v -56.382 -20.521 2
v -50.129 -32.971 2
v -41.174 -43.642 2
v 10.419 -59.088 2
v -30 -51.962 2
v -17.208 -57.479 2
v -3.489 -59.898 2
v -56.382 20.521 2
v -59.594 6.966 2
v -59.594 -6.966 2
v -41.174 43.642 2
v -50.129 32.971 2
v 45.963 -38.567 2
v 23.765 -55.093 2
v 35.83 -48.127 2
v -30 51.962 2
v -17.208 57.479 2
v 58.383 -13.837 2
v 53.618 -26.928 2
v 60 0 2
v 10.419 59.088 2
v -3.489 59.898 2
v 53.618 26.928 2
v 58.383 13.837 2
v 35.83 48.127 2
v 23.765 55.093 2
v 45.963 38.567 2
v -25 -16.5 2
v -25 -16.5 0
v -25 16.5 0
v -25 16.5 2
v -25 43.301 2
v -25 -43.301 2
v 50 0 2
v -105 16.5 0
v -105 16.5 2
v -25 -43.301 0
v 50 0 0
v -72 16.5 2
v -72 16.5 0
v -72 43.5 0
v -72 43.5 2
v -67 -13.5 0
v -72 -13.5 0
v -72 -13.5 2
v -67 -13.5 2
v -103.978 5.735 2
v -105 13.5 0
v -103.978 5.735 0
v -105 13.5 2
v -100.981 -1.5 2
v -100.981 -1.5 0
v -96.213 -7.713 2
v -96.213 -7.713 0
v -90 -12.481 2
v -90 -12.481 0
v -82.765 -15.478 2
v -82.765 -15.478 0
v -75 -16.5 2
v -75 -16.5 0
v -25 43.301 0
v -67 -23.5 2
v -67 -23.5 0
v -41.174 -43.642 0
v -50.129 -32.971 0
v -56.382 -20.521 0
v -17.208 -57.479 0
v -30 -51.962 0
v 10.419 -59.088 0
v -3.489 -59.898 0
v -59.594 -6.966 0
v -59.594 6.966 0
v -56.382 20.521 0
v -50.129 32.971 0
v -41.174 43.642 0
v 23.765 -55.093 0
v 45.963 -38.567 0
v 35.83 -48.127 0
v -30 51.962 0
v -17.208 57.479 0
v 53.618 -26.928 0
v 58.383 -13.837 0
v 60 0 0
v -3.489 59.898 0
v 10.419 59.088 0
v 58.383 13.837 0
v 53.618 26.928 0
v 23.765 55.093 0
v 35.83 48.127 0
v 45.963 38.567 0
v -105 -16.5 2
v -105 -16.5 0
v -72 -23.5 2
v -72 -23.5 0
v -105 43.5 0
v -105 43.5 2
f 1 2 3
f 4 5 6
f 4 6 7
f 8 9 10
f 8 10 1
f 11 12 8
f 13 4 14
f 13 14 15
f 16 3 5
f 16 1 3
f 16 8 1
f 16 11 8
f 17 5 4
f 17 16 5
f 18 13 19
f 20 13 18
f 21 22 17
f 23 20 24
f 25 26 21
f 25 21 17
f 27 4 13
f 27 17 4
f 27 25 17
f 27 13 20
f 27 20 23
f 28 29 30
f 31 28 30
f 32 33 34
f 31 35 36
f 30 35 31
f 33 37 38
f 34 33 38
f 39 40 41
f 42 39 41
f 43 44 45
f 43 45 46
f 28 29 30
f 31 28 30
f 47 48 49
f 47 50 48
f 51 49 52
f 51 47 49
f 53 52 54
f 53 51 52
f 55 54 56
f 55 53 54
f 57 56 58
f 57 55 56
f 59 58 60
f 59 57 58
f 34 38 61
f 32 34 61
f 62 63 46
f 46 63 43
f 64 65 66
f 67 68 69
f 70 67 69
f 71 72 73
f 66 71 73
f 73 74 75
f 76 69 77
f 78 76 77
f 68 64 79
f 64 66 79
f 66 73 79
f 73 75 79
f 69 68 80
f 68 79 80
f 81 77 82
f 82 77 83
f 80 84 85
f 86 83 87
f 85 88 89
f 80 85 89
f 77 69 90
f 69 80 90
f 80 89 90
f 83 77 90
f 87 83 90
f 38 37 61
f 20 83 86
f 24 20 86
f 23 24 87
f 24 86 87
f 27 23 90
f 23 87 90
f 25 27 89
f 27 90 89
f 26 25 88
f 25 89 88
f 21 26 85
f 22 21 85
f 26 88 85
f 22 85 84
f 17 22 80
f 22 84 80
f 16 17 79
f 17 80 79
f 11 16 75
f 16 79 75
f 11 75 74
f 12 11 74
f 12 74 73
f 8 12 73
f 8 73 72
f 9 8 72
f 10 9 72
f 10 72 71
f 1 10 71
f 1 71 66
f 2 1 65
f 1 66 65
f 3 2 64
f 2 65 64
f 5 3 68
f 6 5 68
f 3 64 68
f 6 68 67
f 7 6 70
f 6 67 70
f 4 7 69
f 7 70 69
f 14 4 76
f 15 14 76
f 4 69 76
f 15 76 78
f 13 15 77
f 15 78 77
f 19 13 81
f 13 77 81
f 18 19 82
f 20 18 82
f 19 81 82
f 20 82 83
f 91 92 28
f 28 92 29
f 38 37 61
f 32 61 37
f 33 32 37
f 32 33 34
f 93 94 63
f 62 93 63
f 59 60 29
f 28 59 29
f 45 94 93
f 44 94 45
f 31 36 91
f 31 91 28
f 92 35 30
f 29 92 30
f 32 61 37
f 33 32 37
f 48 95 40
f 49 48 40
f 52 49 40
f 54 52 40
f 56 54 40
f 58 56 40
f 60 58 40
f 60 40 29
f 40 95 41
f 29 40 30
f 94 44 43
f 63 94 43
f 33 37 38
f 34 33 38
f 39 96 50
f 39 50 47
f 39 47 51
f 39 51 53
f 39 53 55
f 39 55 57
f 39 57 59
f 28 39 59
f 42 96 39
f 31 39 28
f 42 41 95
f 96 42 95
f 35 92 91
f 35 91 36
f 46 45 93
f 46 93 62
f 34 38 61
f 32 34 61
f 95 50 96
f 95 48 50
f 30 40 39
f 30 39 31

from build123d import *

# Parameters (mm, degrees)
BOX_W            = 80
BOX_H            = 33
BOX_DEPTH        = 2
EXTRUDE_DEPTH    = 2
EXTRUDE001_DEPTH = 2
BOX001_W         = 60
BOX001_H         = 33
BOX001_DEPTH     = 2
BOX002_W         = 80
BOX002_H         = 33
BOX002_DEPTH     = 2
FILLET_R         = 30
CYLINDER_R       = 60
CYLINDER_DEPTH   = 2
BOX003_W         = 5
BOX003_H         = 10
BOX003_DEPTH     = 2


with BuildPart() as rabo:
    # Box → Box (new body)
    with BuildSketch(Plane(origin=(-105, -16.5, 0), x_dir=(1, 0, 0), z_dir=(0, 0, 1))):
        with Locations((40, 16.5)):
            Rectangle(BOX_W, BOX_H)
    extrude(amount=BOX_DEPTH)


with BuildPart() as extrude_body:
    # RegularPolygon002 → Extrude (new body)
    with BuildSketch(Plane(origin=(12.5, 0, 0), x_dir=(0, 1, 0), z_dir=(0, 0, 1))):
        Polygon((0, -37.5), (43.30127, 37.5), (-43.30127, 37.5), align=None)
    extrude(amount=EXTRUDE_DEPTH)


with BuildPart() as frecha:
    # RegularPolygon002 → Extrude001 (new body)
    with BuildSketch(Plane(origin=(12.5, 0, 0), x_dir=(0, 1, 0), z_dir=(0, 0, 1))):
        Polygon((0, -37.5), (43.30127, 37.5), (-43.30127, 37.5), align=None)
    extrude(amount=EXTRUDE001_DEPTH)


with BuildPart() as cubo001:
    # Box001 → Box001 (new body)
    with BuildSketch(Plane(origin=(-72, -16.5, 0), x_dir=(0, 1, 0), z_dir=(0, 0, 1))):
        with Locations((30, 16.5)):
            Rectangle(BOX001_W, BOX001_H)
    extrude(amount=BOX001_DEPTH)


with BuildPart() as xiro:
    # Box002 → Box002 (new body)
    with BuildSketch(Plane(origin=(-105, -16.5, 0), x_dir=(1, 0, 0), z_dir=(0, 0, 1))):
        with Locations((40, 16.5)):
            Rectangle(BOX002_W, BOX002_H)
    extrude(amount=BOX002_DEPTH)

    # Fusion: union Cubo001
    add(cubo001.part)

    # Fillet
    fillet_edges = [xiro.edges().sort_by_distance(p)[0] for p in [
        (-105, -16.5, 1),
    ]]
    fillet(fillet_edges, radius=FILLET_R)


with BuildPart() as circulo:
    # Cylinder → Cylinder (new body)
    with BuildSketch(Plane.XY):
        Circle(CYLINDER_R)
    extrude(amount=CYLINDER_DEPTH)


with BuildPart() as cubo:
    # Box003 → Box003 (new body)
    with BuildSketch(Plane(origin=(-72, -23.5, 0), x_dir=(1, 0, 0), z_dir=(0, 0, 1))):
        with Locations((2.5, 5)):
            Rectangle(BOX003_W, BOX003_H)
    extrude(amount=BOX003_DEPTH)


solid = Compound([rabo.part, extrude_body.part, frecha.part, xiro.part, circulo.part, cubo.part])
